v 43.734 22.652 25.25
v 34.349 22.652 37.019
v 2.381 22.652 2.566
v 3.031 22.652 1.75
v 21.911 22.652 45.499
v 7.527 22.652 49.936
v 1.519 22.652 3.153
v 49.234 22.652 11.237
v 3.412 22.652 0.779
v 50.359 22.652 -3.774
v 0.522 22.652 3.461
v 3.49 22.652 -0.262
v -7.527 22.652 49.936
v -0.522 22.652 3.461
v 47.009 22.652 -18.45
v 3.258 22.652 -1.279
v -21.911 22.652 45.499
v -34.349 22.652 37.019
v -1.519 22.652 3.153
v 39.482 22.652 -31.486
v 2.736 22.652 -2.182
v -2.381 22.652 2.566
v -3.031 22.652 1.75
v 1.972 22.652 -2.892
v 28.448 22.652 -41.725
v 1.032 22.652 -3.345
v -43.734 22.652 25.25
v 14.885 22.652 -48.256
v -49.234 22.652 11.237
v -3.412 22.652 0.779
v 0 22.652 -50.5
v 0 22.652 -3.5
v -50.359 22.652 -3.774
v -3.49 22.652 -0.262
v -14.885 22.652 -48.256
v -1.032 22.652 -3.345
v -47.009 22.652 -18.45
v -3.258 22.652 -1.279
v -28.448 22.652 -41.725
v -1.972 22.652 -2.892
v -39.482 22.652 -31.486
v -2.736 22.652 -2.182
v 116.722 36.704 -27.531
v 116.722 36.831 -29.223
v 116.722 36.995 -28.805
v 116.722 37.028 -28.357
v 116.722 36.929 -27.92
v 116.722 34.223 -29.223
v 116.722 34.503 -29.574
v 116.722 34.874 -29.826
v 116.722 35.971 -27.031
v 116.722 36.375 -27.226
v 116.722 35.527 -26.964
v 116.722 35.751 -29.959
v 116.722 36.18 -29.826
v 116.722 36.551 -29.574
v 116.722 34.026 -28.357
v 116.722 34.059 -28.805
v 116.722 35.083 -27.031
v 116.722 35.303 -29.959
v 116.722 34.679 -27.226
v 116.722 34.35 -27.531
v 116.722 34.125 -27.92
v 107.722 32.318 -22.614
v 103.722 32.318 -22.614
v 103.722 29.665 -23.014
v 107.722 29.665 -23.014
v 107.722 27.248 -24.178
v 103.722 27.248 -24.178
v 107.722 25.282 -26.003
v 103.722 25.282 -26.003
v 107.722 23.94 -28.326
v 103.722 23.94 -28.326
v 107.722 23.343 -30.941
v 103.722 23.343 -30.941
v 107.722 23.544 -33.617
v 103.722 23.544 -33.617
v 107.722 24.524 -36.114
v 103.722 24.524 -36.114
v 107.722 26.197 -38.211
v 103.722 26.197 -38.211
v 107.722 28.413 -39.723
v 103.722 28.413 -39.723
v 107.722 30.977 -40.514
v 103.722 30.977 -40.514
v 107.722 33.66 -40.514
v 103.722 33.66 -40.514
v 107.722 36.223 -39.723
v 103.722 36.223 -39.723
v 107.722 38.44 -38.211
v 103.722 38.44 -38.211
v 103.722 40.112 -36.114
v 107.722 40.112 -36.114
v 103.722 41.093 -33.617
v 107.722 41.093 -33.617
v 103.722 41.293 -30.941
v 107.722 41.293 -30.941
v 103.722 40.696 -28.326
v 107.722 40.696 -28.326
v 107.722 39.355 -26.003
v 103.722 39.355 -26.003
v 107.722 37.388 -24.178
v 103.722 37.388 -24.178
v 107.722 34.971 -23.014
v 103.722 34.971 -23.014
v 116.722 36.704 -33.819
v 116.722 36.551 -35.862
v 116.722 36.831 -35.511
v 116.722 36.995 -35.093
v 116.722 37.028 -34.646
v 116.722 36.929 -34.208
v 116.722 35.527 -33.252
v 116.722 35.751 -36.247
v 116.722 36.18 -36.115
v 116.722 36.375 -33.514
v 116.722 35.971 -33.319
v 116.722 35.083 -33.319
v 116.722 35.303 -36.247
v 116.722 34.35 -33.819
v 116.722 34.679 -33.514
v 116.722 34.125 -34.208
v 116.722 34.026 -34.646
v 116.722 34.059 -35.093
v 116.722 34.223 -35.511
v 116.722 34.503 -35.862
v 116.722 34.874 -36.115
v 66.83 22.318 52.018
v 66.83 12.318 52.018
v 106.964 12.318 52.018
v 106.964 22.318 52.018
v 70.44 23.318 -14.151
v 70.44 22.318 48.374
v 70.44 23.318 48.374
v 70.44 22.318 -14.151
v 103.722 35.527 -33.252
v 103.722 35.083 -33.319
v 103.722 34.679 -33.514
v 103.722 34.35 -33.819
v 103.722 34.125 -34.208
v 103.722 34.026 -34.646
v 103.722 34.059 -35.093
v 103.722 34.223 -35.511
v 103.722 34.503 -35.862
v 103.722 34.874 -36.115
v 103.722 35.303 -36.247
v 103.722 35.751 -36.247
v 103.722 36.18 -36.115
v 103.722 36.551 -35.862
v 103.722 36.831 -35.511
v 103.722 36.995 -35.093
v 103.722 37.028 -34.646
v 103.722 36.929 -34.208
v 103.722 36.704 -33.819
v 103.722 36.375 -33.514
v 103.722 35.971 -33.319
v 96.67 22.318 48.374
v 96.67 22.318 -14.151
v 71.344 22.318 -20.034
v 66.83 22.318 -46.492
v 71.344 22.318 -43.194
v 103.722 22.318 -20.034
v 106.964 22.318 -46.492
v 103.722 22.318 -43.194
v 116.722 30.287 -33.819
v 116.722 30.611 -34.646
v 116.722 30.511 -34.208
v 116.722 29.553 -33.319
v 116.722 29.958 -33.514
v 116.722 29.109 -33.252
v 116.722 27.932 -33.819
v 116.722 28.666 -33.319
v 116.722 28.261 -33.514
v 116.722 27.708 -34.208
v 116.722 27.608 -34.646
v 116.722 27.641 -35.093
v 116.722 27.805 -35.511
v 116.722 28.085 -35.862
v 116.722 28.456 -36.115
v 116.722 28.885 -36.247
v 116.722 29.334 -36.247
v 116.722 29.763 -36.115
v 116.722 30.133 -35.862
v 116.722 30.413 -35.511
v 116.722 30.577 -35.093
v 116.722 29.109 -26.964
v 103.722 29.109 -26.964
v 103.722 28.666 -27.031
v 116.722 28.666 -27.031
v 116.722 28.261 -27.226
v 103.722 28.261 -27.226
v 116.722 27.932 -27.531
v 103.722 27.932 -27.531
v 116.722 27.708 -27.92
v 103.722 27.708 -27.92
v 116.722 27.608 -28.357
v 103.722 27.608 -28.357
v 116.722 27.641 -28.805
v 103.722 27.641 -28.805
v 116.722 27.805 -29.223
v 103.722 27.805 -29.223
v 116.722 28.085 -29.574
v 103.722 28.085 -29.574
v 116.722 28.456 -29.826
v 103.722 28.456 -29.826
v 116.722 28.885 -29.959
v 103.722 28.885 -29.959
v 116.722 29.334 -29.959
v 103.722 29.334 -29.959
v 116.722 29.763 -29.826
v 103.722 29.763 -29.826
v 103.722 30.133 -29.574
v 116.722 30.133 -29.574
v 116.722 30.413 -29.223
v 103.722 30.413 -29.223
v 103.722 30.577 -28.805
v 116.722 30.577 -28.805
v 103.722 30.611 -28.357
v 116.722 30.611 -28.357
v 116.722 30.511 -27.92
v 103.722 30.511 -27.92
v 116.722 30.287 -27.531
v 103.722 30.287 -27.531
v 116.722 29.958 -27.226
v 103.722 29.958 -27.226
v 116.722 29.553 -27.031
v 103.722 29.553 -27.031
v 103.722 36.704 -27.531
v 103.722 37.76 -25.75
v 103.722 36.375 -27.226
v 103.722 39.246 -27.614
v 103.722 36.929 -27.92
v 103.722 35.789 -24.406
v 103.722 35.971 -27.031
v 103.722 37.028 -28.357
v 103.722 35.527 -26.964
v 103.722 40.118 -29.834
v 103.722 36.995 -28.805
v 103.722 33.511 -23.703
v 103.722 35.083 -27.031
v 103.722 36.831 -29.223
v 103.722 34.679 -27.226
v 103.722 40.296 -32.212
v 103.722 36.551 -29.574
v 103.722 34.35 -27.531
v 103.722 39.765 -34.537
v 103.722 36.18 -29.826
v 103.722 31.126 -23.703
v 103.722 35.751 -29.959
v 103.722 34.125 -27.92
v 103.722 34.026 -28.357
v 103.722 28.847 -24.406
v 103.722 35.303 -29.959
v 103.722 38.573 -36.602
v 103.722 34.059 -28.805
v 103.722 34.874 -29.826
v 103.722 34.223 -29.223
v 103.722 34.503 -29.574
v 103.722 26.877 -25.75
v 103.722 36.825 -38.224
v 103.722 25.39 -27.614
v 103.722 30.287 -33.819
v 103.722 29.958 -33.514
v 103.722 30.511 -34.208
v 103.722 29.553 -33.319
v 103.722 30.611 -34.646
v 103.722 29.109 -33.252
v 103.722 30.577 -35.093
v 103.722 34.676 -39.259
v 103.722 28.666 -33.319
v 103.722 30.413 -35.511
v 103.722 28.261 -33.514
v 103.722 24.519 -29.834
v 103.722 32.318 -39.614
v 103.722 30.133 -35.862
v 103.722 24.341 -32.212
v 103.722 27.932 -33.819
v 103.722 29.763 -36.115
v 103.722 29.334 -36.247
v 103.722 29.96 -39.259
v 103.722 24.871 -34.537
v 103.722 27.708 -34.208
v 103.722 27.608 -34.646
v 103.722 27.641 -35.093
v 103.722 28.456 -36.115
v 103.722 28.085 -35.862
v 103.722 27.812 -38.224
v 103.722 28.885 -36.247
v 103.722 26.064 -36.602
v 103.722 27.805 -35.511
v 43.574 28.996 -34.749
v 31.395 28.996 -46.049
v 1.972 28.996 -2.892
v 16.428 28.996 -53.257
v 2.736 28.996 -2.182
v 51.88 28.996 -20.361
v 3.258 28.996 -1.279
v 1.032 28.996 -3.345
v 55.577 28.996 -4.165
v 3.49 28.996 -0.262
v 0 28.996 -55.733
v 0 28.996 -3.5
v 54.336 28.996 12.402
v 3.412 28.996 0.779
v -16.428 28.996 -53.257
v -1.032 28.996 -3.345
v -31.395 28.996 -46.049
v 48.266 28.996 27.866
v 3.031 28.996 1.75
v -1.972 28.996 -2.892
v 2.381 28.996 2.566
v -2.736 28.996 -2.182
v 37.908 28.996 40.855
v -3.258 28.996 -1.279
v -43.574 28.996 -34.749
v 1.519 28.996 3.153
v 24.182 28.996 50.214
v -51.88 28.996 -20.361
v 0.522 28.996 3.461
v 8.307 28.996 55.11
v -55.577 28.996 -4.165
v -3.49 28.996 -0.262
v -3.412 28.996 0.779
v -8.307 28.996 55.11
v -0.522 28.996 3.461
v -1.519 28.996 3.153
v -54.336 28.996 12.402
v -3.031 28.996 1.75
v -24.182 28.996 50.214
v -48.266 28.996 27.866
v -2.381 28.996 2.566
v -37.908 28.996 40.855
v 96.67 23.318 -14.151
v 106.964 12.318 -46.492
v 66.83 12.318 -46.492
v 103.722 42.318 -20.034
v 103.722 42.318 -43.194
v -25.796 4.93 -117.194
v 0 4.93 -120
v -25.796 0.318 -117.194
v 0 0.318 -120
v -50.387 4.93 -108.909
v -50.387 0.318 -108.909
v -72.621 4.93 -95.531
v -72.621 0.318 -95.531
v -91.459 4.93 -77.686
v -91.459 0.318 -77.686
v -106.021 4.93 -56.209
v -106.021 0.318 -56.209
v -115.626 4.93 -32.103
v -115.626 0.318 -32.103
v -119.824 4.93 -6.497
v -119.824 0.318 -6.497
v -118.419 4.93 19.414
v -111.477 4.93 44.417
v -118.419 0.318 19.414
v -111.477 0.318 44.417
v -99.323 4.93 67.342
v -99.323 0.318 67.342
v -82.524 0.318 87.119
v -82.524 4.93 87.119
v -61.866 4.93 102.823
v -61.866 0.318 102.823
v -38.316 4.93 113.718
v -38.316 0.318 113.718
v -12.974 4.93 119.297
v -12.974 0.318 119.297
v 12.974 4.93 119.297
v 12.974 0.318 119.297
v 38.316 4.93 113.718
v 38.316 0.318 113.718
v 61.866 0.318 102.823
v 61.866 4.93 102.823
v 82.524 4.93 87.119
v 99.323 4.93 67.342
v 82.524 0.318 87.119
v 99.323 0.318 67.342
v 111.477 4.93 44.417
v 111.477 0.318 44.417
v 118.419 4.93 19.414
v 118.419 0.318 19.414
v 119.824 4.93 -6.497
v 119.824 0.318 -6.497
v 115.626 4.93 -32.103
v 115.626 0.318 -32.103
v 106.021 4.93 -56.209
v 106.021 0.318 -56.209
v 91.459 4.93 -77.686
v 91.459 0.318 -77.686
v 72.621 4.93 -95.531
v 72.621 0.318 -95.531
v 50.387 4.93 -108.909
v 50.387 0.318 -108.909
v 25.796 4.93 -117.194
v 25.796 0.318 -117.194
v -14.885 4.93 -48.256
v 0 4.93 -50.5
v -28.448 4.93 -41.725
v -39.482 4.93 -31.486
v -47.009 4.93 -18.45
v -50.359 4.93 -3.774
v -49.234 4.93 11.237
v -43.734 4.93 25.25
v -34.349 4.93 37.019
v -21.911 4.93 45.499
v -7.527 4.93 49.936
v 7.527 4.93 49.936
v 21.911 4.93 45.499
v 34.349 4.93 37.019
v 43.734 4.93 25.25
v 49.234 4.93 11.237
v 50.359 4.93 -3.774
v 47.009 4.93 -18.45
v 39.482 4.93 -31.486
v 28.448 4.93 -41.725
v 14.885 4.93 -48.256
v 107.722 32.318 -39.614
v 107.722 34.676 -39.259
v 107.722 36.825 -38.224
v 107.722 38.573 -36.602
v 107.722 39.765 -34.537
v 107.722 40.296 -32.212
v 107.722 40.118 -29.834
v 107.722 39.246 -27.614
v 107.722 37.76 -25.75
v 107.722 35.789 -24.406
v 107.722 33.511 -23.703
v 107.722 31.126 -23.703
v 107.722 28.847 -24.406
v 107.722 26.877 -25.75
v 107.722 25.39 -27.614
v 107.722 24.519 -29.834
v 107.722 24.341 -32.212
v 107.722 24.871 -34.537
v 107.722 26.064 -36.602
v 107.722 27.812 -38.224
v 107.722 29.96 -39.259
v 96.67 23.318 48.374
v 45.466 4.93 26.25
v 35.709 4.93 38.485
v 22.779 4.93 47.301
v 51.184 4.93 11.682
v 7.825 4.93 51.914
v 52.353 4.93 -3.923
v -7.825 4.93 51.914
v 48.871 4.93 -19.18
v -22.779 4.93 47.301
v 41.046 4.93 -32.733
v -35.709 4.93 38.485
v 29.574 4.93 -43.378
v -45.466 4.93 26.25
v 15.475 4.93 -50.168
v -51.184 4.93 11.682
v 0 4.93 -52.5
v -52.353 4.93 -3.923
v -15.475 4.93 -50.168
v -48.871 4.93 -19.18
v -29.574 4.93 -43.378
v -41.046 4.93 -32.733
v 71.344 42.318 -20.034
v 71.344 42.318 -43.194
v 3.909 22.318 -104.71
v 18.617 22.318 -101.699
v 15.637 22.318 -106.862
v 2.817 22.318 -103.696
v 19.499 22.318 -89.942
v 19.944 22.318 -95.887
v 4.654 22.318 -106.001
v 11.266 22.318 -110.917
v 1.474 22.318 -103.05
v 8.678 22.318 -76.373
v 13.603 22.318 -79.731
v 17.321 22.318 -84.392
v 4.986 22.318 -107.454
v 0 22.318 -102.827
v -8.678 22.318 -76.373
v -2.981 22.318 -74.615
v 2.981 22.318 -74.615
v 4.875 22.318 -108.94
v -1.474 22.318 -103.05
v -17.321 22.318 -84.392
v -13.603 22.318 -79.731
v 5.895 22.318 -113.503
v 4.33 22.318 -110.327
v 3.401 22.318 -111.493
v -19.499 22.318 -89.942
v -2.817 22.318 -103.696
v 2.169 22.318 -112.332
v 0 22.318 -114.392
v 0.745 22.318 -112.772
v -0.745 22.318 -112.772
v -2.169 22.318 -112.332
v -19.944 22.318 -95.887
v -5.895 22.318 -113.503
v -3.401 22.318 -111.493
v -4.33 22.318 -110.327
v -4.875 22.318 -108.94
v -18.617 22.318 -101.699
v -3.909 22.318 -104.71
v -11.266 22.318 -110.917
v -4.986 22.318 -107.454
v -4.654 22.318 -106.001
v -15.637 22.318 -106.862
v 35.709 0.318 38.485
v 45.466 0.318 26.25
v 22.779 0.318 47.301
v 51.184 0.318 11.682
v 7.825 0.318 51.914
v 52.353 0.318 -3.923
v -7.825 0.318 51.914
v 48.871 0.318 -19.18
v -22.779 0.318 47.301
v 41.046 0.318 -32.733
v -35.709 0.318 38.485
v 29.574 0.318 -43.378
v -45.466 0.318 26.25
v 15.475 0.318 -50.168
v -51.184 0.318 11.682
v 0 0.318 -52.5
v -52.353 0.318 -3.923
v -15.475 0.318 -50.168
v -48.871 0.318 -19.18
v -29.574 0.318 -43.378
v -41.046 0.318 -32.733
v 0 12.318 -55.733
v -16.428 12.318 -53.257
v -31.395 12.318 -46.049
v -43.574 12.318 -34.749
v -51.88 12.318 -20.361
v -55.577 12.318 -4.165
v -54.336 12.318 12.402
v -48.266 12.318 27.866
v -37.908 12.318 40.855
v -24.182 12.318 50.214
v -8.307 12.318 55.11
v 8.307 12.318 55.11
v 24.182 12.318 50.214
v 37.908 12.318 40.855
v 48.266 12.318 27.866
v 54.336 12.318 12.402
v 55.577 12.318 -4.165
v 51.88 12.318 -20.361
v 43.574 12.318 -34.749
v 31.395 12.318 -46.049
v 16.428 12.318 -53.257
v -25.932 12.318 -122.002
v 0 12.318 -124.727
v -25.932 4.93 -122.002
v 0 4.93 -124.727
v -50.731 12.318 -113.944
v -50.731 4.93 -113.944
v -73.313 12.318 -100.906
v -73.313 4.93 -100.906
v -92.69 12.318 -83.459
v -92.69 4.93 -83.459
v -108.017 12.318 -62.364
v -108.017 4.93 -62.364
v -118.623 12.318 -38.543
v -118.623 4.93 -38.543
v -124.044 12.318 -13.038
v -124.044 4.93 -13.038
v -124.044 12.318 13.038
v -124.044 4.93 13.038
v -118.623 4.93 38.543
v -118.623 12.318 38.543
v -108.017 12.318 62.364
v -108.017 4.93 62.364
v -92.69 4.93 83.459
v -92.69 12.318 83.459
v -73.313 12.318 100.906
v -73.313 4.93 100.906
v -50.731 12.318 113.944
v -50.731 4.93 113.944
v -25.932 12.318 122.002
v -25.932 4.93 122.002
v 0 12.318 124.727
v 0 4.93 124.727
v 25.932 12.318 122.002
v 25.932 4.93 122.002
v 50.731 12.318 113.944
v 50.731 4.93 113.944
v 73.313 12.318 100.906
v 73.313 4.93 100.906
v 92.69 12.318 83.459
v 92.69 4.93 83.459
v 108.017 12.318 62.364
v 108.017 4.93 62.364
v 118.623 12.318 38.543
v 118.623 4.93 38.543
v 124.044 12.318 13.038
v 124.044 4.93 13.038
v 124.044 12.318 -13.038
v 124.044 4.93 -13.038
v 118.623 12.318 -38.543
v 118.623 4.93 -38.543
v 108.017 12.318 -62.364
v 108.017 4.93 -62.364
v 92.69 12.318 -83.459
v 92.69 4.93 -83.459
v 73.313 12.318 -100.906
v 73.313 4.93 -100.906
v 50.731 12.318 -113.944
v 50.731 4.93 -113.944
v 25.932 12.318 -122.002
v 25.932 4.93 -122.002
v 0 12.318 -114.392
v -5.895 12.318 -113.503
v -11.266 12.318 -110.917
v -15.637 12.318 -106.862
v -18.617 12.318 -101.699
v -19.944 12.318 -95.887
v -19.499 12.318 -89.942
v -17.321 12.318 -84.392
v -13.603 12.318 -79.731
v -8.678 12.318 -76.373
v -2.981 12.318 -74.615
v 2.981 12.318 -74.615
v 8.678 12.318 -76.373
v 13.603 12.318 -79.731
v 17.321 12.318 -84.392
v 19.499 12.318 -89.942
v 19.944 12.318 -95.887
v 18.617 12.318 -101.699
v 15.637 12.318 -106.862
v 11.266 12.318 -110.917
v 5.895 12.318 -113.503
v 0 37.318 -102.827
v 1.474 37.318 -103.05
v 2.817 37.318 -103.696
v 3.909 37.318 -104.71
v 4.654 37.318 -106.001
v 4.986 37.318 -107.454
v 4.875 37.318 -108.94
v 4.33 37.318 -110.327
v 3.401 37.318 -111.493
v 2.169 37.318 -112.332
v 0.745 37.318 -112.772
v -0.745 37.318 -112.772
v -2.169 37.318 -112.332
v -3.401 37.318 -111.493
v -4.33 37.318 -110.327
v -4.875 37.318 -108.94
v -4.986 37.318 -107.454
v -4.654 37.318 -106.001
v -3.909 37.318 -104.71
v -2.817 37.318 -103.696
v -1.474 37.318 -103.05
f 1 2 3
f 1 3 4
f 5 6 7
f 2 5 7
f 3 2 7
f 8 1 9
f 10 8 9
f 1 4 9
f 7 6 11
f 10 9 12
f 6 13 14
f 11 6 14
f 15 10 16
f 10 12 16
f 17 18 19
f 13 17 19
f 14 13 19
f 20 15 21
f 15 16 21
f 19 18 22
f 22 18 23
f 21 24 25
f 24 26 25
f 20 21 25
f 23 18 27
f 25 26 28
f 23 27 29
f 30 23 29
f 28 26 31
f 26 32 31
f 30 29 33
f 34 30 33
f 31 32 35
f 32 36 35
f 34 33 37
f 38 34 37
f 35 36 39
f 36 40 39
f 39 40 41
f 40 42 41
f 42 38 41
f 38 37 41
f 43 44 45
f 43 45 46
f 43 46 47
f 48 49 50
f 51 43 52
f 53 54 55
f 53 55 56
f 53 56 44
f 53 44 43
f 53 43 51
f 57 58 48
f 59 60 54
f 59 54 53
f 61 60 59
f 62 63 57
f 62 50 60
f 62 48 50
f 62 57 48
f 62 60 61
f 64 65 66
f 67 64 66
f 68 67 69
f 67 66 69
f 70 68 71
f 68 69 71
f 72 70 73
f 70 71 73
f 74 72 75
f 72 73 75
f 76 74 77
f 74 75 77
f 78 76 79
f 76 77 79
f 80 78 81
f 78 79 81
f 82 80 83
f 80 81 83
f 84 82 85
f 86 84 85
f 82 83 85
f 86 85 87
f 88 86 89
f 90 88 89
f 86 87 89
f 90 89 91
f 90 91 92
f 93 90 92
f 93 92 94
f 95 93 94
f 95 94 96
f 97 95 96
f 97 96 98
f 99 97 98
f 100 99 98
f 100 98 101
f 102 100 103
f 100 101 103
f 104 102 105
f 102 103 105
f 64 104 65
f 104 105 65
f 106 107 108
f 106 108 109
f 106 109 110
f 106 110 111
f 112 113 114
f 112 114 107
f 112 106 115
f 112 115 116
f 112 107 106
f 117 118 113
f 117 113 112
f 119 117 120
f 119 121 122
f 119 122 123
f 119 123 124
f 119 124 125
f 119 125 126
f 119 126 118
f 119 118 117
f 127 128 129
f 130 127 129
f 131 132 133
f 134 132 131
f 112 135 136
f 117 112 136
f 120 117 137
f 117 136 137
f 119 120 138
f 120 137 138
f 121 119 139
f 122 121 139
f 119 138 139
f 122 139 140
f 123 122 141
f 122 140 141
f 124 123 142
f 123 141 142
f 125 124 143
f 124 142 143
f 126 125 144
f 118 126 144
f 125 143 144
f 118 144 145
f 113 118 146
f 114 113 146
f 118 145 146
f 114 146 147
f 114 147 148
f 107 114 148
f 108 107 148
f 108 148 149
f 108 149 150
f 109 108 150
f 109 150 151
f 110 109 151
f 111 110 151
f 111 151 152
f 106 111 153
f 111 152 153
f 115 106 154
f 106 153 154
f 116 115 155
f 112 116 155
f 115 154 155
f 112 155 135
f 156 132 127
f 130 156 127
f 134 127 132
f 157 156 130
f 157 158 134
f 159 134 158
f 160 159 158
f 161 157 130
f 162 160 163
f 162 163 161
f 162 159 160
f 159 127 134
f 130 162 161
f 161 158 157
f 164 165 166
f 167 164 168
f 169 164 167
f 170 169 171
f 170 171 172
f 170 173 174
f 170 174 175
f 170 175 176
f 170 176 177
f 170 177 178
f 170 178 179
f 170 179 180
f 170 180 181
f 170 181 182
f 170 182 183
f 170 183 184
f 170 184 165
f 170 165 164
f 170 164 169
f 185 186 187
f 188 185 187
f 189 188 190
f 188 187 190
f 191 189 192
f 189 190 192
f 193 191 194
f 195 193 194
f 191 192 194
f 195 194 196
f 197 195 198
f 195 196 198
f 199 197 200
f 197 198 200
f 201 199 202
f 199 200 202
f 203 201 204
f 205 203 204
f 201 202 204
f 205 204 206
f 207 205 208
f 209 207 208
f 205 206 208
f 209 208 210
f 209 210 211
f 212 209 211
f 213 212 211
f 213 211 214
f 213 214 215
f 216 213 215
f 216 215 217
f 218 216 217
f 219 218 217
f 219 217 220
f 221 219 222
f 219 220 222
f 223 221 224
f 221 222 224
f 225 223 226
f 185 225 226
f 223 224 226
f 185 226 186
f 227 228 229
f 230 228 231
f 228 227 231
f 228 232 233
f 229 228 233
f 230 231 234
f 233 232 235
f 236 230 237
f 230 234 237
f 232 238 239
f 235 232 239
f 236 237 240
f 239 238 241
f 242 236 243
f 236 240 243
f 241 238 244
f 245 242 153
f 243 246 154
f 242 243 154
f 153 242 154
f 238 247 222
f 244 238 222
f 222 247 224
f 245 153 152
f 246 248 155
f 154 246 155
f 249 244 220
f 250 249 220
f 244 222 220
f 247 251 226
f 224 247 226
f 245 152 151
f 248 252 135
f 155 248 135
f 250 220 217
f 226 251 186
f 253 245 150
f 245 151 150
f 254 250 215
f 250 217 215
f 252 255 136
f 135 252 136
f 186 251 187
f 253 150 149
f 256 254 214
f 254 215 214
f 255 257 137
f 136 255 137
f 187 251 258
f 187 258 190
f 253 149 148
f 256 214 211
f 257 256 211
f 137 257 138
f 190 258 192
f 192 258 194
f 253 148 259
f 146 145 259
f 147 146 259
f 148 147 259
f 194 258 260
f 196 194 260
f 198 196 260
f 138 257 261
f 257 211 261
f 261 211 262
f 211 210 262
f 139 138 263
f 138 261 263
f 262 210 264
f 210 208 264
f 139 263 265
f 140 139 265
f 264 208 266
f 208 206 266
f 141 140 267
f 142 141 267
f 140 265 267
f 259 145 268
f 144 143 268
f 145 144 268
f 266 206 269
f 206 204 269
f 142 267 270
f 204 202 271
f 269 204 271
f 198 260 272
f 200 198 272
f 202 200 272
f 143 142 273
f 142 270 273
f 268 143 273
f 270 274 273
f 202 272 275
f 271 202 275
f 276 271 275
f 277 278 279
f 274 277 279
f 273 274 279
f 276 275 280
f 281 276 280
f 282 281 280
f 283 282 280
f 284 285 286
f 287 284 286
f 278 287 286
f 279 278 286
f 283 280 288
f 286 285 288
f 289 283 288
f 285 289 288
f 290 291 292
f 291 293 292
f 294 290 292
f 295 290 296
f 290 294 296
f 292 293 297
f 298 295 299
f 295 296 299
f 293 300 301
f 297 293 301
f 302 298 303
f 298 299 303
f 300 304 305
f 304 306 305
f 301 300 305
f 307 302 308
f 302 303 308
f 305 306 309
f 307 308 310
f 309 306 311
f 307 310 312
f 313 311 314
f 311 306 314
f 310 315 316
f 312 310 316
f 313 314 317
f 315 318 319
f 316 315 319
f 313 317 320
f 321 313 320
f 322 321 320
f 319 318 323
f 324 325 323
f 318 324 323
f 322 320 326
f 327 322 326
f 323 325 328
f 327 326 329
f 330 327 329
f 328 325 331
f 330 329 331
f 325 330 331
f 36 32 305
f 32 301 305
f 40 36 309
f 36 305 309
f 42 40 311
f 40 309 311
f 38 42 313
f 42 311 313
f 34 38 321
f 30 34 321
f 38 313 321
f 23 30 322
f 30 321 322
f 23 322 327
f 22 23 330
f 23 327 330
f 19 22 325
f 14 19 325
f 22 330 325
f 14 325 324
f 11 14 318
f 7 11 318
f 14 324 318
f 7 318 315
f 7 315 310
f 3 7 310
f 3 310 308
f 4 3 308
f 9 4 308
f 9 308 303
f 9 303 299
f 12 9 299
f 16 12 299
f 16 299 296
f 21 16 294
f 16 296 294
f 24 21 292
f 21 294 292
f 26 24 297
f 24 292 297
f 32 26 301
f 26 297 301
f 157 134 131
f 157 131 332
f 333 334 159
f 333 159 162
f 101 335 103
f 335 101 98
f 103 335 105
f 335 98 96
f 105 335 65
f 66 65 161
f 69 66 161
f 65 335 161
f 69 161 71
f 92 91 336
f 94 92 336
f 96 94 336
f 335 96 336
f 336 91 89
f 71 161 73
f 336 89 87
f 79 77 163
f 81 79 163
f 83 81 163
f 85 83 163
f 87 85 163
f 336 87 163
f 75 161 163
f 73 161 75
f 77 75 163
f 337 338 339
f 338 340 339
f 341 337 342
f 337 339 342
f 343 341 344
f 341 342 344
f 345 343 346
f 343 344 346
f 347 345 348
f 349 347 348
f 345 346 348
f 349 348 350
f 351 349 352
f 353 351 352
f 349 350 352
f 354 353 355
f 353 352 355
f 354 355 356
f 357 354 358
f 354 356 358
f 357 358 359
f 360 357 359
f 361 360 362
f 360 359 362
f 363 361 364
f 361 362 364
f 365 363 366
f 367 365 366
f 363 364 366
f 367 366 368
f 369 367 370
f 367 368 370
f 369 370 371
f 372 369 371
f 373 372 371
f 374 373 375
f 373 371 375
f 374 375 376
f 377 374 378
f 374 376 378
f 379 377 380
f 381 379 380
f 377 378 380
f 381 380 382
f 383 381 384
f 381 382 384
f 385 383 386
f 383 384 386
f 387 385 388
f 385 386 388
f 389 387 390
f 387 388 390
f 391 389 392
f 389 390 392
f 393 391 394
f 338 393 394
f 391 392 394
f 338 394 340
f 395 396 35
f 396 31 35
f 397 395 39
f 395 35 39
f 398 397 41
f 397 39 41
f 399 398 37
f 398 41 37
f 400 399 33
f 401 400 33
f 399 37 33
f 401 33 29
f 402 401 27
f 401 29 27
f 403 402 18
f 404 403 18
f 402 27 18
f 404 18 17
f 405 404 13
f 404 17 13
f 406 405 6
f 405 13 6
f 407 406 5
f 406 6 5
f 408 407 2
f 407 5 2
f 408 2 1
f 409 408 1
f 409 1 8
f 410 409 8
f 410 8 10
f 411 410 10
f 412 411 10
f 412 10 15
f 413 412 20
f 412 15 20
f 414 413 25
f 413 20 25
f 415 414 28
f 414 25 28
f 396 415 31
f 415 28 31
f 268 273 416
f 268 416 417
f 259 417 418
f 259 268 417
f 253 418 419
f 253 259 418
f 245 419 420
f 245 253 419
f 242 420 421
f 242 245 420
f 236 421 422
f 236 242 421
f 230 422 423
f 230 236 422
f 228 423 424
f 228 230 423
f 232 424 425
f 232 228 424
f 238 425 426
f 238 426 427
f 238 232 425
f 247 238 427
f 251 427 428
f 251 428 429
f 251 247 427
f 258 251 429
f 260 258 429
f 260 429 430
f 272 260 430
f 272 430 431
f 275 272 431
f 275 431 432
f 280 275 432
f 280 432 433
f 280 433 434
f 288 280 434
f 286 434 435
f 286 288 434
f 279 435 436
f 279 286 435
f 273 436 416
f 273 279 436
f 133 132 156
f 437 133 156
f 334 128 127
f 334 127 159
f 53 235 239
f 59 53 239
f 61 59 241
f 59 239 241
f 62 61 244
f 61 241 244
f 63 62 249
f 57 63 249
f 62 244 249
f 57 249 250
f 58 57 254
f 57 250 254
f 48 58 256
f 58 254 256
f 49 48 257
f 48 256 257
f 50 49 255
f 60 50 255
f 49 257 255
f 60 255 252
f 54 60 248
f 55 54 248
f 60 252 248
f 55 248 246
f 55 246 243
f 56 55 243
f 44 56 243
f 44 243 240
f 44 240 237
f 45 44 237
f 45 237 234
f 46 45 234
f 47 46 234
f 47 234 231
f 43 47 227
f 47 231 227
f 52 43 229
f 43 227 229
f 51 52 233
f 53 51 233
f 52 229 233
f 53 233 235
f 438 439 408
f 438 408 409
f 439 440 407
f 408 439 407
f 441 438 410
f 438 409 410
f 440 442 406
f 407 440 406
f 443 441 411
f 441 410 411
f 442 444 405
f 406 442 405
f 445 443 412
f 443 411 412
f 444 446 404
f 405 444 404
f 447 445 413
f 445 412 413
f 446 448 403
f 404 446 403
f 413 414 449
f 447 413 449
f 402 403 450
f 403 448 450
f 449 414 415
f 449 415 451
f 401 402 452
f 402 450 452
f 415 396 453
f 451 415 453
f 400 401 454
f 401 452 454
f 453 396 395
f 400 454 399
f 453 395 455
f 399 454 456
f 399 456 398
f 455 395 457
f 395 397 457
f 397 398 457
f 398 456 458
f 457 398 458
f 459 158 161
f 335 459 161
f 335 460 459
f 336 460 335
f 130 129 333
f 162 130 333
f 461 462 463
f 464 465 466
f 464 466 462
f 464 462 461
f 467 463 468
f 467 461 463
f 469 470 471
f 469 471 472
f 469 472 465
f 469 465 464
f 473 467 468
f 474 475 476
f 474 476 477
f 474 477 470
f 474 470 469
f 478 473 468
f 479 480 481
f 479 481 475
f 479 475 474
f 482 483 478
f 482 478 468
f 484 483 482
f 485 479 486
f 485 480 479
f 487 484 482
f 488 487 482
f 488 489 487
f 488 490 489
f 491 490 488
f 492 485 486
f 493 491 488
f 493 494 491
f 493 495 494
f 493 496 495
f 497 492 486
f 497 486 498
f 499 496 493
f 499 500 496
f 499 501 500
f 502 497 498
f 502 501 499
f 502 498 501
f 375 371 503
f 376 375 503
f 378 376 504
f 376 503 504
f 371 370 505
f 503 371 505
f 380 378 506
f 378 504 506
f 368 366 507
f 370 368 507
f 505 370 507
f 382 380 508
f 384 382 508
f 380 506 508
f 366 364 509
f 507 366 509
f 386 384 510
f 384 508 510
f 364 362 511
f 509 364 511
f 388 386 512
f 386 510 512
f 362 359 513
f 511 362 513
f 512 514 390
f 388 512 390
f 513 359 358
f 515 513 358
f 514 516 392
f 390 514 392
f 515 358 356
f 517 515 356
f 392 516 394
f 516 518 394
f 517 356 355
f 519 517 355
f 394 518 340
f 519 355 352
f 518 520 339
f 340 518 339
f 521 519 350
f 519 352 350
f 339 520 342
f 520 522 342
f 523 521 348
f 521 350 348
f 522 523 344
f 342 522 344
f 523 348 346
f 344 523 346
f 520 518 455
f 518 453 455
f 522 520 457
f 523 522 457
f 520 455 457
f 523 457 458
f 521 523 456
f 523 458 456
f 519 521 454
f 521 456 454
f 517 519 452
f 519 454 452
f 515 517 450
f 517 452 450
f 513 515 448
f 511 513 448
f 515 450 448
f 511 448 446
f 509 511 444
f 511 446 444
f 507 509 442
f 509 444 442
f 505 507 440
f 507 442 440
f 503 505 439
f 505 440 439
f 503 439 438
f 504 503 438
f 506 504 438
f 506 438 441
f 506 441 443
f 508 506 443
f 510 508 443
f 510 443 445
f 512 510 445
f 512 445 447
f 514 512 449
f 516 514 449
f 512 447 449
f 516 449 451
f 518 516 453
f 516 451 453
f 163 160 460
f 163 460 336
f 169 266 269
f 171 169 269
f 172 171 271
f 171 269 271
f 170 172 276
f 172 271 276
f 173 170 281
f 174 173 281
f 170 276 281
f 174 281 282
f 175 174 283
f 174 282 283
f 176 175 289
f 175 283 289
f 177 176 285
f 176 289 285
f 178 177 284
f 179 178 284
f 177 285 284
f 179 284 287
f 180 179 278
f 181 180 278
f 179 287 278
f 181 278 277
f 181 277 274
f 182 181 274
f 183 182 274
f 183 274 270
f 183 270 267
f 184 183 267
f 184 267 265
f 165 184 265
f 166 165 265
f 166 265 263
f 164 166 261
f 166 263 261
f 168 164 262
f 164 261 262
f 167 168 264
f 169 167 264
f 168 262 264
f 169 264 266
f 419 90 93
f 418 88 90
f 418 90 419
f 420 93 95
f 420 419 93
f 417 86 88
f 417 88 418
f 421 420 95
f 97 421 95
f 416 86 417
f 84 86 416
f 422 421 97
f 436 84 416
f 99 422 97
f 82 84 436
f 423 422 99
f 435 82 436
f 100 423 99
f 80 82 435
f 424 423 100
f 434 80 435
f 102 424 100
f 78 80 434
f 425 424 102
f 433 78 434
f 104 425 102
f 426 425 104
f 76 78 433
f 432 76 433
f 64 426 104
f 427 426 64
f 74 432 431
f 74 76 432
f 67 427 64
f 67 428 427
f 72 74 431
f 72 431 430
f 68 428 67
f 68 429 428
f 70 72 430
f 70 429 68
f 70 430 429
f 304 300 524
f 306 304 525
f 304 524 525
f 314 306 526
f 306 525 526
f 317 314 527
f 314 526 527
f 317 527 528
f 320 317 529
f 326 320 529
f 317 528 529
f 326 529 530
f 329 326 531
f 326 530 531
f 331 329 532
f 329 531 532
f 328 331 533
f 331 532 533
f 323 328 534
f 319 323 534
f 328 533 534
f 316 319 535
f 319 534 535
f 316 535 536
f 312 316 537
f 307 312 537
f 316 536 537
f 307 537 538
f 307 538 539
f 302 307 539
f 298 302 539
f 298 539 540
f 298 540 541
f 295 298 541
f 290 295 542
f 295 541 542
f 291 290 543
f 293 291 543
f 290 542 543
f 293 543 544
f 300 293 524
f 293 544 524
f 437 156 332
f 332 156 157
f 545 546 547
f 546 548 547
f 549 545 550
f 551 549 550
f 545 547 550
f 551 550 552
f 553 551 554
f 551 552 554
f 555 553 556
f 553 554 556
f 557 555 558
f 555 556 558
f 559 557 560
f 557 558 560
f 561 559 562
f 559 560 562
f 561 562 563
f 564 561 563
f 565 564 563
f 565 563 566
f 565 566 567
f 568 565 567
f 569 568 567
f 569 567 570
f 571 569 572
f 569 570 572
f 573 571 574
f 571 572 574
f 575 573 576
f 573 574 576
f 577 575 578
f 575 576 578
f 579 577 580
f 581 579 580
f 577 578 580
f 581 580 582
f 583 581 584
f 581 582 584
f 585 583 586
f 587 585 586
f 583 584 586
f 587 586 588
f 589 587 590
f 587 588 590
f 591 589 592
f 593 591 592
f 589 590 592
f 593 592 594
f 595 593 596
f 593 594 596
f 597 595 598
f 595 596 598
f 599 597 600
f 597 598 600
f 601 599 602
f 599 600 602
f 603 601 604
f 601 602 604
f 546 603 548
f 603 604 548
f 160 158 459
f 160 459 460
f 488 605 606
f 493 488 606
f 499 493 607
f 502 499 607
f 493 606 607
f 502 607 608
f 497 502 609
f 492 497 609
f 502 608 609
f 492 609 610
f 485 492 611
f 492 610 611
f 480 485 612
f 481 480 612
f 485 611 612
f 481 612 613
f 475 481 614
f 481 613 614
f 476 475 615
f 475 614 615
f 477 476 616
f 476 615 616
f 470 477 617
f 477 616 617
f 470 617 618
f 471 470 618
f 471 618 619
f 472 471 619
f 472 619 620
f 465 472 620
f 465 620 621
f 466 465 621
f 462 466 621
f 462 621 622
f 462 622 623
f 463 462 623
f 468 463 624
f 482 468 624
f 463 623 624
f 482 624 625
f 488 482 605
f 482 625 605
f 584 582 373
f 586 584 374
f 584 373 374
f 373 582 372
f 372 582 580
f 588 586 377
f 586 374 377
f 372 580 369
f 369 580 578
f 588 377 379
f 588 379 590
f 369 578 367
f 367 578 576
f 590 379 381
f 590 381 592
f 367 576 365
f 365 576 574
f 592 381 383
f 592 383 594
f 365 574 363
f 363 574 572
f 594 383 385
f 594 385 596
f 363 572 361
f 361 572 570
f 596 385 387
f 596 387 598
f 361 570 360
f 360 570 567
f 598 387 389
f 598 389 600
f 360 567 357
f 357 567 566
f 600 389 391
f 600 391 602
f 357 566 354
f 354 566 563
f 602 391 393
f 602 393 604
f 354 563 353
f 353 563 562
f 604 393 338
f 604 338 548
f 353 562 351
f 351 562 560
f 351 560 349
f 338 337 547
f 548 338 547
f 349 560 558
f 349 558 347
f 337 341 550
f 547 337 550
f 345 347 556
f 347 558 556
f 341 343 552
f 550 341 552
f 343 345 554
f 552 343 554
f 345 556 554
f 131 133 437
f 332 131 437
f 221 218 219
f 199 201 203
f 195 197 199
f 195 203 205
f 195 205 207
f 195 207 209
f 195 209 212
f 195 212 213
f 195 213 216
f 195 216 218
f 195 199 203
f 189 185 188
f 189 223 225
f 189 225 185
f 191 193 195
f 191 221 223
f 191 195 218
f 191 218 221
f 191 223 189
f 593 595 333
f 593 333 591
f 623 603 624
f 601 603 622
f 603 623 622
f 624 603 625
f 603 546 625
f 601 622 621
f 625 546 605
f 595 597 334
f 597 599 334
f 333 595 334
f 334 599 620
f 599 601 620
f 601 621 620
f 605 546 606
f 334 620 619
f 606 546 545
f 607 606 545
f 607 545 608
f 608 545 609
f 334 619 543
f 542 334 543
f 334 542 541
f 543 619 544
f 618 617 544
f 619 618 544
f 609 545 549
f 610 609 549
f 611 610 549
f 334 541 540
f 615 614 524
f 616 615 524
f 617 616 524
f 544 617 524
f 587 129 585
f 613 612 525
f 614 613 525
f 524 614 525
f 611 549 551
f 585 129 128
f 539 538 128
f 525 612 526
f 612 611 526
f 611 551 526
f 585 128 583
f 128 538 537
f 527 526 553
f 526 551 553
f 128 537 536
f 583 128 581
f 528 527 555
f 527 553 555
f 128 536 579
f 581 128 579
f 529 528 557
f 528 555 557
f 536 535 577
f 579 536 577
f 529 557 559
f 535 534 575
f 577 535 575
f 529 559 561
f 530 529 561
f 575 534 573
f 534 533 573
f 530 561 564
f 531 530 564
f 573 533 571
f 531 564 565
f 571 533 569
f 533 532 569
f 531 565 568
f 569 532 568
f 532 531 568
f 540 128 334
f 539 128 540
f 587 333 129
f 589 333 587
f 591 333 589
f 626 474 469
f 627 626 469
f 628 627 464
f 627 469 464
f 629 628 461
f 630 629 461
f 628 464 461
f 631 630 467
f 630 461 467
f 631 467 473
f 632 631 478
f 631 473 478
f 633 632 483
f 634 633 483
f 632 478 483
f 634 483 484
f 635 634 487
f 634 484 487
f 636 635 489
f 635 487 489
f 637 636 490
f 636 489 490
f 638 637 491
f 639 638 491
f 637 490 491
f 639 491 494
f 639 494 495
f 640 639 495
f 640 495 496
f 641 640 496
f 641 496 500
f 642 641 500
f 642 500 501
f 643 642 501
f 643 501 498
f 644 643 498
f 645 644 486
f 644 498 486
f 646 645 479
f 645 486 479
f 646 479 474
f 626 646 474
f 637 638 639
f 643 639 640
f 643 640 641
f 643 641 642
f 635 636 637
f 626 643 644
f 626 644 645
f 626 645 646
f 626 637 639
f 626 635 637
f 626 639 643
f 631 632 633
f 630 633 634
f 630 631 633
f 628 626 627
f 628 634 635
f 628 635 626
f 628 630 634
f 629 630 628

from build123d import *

# Parameters (mm, degrees)
SKETCH2_R           = 20
SKETCH2_W           = 40.133980871
SKETCH2_H           = 98.510680321
BOSS_EXTRUDE1_DEPTH = 10
SKETCH3_W           = 26.229690347
SKETCH3_H           = 62.525074854
BOSS_EXTRUDE2_DEPTH = 1
SKETCH4_R           = 5
BOSS_EXTRUDE3_DEPTH = 15
SKETCH5_W           = 32.37828677
SKETCH5_H           = 23.159469009
BOSS_EXTRUDE4_DEPTH = 20
SKETCH6_R           = 9
SKETCH6_R_2         = 8
BOSS_EXTRUDE5_DEPTH = 4
SKETCH7_R           = 1.505673325
BOSS_EXTRUDE6_DEPTH = 13


with BuildPart() as part:
    # Sketch1 → Revolve2 (revolve)
    with BuildSketch(Plane(origin=(0, 0, 0), x_dir=(0, 0, -1), z_dir=(1, 0, 0)), mode=Mode.PRIVATE) as revolve2_sk:
        Polygon((-124.727272727, 4.929753727), (-120, 4.929753727), (-120, 0.318181818), (-52.5, 0.318181818), (-52.5, 4.929753727), (-50.5, 4.929753727), (-50.5, 12.318181818), (-50.5, 22.651670955), (-3.5, 22.651670955), (-3.5, 28.996436074), (-50.5, 28.996436074), (-55.732846455, 28.996436074), (-55.732846455, 12.318181818), (-124.727272727, 12.318181818), align=None)
    revolve(revolve2_sk.sketch.rotate(Axis((0, -1000, 0), (0, 1, 0)), 180), axis=Axis((0, -1000, 0), (0, 1, 0)))

    # Sketch2 → Boss-Extrude1 (add)
    with BuildSketch(Plane(origin=(0, 12.318181818, 0), x_dir=(1, 0, 0), z_dir=(0, 1, 0))):
        with Locations(Location((0, 94.391996497, 0), (0, 0, 90))):
            Circle(SKETCH2_R)
        with Locations((86.897306122, -2.763043919)):
            Rectangle(SKETCH2_W, SKETCH2_H)
    extrude(amount=BOSS_EXTRUDE1_DEPTH)

    # Sketch3 → Boss-Extrude2 (add)
    with BuildSketch(Plane(origin=(0, 22.318181818, 0), x_dir=(1, 0, 0), z_dir=(0, 1, 0))):
        with Locations((83.554770675, -17.111809319)):
            Rectangle(SKETCH3_W, SKETCH3_H)
    extrude(amount=BOSS_EXTRUDE2_DEPTH)

    # Sketch4 → Boss-Extrude3 (add)
    with BuildSketch(Plane(origin=(0, 22.318181818, 0), x_dir=(1, 0, 0), z_dir=(0, 1, 0))):
        with Locations(Location((0, 107.827495102, 0), (0, 0, 270))):
            Circle(SKETCH4_R)
    extrude(amount=BOSS_EXTRUDE3_DEPTH)

    # Sketch5 → Boss-Extrude4 (add)
    with BuildSketch(Plane(origin=(0, 22.318181818, 0), x_dir=(1, 0, 0), z_dir=(0, 1, 0))):
        with Locations((87.532995765, 31.614032761)):
            Rectangle(SKETCH5_W, SKETCH5_H)
    extrude(amount=BOSS_EXTRUDE4_DEPTH)

    # Sketch6 → Boss-Extrude5 (add)
    with BuildSketch(Plane(origin=(103.72213915, 0, 0), x_dir=(0, 0, -1), z_dir=(1, 0, 0))):
        with Locations(Location((31.614032762, 32.318181818, 0), (0, 0, 180))):
            Circle(SKETCH6_R)
        with Locations((31.614032762, 32.318181818)):
            Circle(SKETCH6_R_2, mode=Mode.SUBTRACT)
    extrude(amount=BOSS_EXTRUDE5_DEPTH)

    # Sketch7 → Boss-Extrude6 (add)
    with BuildSketch(Plane(origin=(103.72213915, 0, 0), x_dir=(0, 0, -1), z_dir=(1, 0, 0))):
        with Locations(Location((34.758166352, 35.526981806, 0), (0, 0, 180))):
            Circle(SKETCH7_R)
        with Locations(Location((28.469899171, 35.526981806, 0), (0, 0, 180))):
            Circle(SKETCH7_R)
        with Locations(Location((34.758166352, 29.10938183, 0), (0, 0, 180))):
            Circle(SKETCH7_R)
        with Locations(Location((28.469899171, 29.10938183, 0), (0, 0, 180))):
            Circle(SKETCH7_R)
    extrude(amount=BOSS_EXTRUDE6_DEPTH)


solid = part.part
